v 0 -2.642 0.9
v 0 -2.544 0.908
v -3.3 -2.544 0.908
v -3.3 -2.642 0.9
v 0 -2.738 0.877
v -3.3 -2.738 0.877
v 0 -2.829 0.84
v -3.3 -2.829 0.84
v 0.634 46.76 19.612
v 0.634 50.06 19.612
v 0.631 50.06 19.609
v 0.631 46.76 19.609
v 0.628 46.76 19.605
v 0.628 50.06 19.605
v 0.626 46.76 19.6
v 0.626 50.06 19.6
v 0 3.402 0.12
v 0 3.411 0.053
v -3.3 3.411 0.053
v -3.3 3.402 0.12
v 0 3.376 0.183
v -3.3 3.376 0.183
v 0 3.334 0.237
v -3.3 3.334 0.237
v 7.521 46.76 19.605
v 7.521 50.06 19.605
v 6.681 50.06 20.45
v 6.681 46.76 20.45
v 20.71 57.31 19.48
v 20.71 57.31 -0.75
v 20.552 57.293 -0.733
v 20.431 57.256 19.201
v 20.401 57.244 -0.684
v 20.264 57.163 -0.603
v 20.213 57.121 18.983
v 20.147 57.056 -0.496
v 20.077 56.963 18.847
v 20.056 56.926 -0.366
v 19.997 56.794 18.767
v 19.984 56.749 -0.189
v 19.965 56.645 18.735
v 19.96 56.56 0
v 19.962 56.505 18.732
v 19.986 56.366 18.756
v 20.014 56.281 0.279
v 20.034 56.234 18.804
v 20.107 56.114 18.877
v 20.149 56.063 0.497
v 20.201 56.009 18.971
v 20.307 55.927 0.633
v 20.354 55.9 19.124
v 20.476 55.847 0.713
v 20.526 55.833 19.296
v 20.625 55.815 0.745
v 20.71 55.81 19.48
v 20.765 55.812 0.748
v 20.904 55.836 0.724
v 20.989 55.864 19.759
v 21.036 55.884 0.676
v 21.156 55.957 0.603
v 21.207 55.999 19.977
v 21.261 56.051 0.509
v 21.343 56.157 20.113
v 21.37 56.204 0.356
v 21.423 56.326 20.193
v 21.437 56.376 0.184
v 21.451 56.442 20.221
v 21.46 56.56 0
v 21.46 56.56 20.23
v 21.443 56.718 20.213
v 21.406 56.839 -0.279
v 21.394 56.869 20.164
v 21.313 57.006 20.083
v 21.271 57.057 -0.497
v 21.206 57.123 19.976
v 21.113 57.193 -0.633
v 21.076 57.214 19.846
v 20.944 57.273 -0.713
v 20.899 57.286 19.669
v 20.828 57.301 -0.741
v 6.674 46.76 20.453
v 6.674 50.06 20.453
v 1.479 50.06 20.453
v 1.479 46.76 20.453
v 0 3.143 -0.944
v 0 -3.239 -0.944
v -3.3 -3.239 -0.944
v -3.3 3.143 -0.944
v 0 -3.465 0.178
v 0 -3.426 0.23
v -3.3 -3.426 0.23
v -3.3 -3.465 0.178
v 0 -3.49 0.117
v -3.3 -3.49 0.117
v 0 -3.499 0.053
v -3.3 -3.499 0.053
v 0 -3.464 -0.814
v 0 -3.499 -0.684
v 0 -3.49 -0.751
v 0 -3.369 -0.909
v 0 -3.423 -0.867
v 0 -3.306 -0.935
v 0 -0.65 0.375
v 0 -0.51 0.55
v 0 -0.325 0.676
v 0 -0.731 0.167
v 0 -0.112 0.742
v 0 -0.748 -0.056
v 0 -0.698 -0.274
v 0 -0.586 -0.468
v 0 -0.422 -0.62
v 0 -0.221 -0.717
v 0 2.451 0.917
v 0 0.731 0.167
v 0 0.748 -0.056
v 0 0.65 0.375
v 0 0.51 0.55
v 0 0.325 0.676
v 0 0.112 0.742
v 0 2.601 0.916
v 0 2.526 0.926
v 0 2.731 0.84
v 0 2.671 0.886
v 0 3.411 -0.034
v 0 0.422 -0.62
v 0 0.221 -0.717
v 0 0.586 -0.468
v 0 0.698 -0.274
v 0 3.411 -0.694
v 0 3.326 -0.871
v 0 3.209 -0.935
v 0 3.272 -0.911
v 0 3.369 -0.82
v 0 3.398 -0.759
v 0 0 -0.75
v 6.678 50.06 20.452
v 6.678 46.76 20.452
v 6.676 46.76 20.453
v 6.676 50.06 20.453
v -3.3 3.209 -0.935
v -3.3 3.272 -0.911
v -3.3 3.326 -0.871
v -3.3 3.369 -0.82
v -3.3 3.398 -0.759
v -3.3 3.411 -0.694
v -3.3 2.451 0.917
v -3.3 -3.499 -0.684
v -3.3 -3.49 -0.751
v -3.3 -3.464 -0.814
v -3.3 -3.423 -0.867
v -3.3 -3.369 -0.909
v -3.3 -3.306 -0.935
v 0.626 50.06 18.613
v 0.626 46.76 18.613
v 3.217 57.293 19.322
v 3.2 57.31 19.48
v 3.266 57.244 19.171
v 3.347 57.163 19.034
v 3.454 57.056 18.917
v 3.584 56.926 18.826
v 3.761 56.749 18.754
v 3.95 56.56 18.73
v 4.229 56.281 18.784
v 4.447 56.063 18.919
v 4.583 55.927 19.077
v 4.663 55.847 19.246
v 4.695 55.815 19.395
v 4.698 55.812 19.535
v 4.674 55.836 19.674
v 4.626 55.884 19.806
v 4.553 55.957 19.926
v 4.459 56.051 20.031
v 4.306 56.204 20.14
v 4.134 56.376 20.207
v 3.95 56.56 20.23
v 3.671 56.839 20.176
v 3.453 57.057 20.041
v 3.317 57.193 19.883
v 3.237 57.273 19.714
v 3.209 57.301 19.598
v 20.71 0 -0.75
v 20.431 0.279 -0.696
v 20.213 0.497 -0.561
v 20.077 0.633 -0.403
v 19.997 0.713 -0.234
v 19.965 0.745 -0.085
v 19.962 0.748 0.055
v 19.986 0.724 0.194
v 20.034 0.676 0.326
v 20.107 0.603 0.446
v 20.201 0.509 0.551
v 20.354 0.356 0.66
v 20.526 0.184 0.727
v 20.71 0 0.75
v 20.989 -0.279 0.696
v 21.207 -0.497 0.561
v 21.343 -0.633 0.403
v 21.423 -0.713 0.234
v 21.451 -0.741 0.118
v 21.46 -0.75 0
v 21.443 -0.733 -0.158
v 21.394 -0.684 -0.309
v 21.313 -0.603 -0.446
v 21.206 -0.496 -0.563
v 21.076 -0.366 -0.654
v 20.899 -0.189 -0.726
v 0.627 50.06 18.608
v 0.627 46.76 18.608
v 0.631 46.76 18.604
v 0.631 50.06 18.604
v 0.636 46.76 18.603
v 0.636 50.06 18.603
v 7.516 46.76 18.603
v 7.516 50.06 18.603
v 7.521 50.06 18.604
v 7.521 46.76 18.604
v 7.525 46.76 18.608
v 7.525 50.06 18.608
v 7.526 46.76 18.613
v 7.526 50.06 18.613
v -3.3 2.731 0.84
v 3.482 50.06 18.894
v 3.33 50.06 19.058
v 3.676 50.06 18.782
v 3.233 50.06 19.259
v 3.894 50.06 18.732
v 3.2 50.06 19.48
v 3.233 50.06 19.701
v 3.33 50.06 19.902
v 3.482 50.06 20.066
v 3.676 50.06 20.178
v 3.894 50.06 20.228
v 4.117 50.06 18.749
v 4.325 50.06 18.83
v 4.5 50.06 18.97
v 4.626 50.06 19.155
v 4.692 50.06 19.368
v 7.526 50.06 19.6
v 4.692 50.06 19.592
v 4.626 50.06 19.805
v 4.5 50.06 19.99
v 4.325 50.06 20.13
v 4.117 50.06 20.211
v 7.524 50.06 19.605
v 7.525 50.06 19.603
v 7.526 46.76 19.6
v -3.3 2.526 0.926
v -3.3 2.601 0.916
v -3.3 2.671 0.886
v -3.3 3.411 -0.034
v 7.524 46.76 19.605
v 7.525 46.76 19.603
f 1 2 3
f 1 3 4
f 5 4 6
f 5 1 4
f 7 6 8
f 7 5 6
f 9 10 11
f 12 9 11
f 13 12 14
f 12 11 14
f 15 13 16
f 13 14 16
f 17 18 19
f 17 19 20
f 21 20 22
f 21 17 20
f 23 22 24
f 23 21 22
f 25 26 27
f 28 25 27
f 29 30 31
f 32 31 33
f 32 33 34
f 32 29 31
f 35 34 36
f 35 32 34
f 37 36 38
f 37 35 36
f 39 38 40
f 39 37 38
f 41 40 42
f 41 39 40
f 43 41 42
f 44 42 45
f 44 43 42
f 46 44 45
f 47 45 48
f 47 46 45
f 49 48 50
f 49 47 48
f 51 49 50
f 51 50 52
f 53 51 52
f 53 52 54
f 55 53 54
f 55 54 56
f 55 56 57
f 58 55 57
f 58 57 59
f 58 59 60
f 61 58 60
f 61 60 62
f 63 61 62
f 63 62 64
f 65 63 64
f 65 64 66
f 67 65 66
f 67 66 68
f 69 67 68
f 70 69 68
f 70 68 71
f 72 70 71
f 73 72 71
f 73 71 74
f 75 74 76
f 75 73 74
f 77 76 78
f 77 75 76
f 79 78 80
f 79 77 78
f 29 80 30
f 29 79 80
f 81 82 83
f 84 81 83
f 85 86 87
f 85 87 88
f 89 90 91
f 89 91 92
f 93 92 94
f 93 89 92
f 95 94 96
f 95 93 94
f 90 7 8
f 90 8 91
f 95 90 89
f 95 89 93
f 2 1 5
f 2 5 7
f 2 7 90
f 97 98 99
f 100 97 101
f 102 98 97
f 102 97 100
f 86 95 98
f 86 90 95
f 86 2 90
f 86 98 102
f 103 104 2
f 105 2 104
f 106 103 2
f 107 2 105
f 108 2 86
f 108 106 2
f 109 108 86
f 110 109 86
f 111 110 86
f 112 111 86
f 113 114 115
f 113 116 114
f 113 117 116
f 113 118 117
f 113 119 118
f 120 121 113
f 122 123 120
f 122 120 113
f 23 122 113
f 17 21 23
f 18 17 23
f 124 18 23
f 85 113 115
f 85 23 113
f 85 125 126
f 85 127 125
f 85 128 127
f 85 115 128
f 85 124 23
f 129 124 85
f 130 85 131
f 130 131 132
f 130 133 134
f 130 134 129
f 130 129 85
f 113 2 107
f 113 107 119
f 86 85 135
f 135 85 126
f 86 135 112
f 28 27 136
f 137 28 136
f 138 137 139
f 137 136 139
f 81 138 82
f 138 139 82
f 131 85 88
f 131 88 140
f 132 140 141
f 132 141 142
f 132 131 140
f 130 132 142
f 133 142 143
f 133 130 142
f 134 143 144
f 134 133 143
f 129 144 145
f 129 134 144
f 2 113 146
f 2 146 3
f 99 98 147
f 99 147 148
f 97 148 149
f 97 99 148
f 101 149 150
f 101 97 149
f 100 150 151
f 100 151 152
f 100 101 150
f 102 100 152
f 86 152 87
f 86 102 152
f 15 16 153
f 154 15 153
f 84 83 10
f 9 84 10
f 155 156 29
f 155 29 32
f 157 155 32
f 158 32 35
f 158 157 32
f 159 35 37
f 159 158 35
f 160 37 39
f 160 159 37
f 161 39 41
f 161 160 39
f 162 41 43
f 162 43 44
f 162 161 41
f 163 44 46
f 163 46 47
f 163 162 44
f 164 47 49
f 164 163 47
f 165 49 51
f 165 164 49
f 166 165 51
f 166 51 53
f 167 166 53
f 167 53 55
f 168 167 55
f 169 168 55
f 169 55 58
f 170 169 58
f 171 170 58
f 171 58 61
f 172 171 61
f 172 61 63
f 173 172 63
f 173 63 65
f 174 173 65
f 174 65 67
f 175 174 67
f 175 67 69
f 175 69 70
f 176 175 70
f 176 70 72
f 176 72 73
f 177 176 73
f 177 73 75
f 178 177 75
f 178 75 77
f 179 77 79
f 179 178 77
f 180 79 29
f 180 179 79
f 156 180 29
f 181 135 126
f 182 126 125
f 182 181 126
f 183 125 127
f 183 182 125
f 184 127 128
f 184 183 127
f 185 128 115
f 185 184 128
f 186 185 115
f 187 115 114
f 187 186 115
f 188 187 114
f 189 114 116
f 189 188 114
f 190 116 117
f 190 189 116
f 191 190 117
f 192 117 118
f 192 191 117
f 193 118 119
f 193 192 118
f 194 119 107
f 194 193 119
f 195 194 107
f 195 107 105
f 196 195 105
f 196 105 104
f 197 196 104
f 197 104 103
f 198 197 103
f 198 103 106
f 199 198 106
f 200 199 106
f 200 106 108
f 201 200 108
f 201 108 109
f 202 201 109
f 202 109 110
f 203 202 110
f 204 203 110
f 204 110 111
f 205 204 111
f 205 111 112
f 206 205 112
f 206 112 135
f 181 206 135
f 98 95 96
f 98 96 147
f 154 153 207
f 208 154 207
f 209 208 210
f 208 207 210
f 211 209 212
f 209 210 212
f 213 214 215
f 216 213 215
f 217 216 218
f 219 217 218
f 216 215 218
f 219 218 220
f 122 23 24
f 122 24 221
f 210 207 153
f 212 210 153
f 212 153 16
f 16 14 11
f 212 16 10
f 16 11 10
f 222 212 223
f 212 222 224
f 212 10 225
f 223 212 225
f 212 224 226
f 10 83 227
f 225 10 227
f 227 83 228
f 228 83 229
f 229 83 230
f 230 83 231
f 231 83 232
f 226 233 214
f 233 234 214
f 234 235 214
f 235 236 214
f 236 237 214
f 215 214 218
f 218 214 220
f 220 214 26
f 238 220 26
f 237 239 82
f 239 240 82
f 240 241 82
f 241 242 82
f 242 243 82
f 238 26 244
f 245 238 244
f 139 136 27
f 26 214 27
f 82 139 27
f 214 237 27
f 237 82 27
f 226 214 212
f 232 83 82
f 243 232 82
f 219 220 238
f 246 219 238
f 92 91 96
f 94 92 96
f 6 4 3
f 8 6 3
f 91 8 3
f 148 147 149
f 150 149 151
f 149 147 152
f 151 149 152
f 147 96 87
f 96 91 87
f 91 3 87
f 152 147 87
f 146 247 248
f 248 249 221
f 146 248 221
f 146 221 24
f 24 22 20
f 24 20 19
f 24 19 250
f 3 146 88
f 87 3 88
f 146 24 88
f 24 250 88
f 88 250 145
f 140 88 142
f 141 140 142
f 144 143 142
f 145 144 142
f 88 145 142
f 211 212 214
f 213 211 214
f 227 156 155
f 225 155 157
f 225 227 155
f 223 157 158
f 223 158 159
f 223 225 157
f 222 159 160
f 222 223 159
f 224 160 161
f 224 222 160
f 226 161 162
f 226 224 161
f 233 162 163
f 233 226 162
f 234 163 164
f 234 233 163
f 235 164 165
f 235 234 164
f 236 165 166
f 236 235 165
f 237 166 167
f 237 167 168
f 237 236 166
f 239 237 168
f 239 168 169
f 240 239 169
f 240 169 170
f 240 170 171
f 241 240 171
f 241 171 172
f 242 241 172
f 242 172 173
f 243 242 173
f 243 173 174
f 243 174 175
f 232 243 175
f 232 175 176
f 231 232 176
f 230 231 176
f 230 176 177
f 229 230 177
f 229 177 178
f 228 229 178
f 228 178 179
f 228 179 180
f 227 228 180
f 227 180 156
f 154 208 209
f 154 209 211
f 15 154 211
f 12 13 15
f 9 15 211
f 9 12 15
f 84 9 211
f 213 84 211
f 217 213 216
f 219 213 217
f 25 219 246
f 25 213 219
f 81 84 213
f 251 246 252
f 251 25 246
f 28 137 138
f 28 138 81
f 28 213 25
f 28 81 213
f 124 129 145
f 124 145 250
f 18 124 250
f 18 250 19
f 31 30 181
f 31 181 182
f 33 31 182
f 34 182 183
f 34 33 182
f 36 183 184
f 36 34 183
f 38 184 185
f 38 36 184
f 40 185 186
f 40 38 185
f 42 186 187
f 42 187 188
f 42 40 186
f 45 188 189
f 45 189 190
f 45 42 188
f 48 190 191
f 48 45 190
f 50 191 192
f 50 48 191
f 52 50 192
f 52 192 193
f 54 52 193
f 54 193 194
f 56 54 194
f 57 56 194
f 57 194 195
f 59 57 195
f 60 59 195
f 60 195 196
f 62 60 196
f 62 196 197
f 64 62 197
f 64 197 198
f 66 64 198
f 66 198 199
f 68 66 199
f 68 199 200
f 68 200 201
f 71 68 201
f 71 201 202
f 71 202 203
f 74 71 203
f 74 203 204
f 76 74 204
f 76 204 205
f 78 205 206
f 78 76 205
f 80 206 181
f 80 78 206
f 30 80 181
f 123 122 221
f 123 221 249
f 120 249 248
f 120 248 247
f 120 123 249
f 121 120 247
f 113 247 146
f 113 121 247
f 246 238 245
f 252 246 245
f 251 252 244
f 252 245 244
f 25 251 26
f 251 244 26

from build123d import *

# Parameters (mm, degrees)
ESQUISSE1_R        = 0.75
BOSS_EXTRU_1_DEPTH = 3.3
BOSS_EXTRU_2_DEPTH = 3.3


with BuildPart() as part:
    # Balayage1: sweep along a curve in space
    with BuildLine() as balayage1_path:
        Line((0, 0, 0), (20.71, 0, 0))
        Line((20.71, 0, 0), (20.71, 56.56, 0))
        Line((20.71, 56.56, 0), (20.71, 56.56, 19.48))
        Line((20.71, 56.56, 19.48), (3.95, 56.56, 19.48))
        Line((3.95, 56.56, 19.48), (3.95, 50.06, 19.48))
    # Esquisse1 → Balayage1 (sweep)
    with BuildSketch(Plane(origin=(0, 0, 0), x_dir=(0, 0, -1), z_dir=(1, 0, 0))):
        Circle(ESQUISSE1_R)
    sweep(path=balayage1_path.line, transition=Transition.RIGHT)

    # Esquisse2 → Boss.-Extru.1 (add)
    with BuildSketch(Plane.ZY):
        with BuildLine():
            Line((-0.693559654, 3.410973121), (-0.033559654, 3.410973121))
            Line((-0.033559654, 3.410973121), (0.052886955, 3.410800656))
            ThreePointArc((0.052886955, 3.410800656), (0.152585895, 3.390814178), (0.237103646, 3.334280227))
            Line((0.237103646, 3.334280227), (0.840288261, 2.731095613))
            ThreePointArc((0.840288261, 2.731095613), (0.915698502, 2.601090787), (0.916612811, 2.450800656))
            Line((0.916612811, 2.450800656), (0.907780092, -2.544199344))
            ThreePointArc((0.907780092, -2.544199344), (0.890549579, -2.690753591), (0.840288109, -2.829493716))
            Line((0.840288109, -2.829493716), (0.229663651, -3.425976039))
            ThreePointArc((0.229663651, -3.425976039), (0.148335129, -3.479631619), (0.052886955, -3.499199344))
            Line((0.052886955, -3.499199344), (-0.683559654, -3.499199344))
            ThreePointArc((-0.683559654, -3.499199344), (-0.867407417, -3.423047107), (-0.943559654, -3.239199344))
            Line((-0.943559654, -3.239199344), (-0.943559654, 3.142794831))
            ThreePointArc((-0.943559654, 3.142794831), (-0.871366367, 3.326111221), (-0.693559654, 3.410973121))
        make_face()
    extrude(amount=BOSS_EXTRU_1_DEPTH)

    # Esquisse8 → Boss.-Extru.2 (add)
    with BuildSketch(Plane.XZ.offset(-50.06)):
        with BuildLine():
            Line((0.626082703, 19.600404574), (0.626082703, 18.6131001))
            ThreePointArc((0.626082703, 18.6131001), (0.629011635, 18.606029032), (0.636082703, 18.6031001))
            Line((0.636082703, 18.6031001), (7.516082703, 18.6031001))
            ThreePointArc((7.516082703, 18.6031001), (7.523153771, 18.606029032), (7.526082703, 18.6131001))
            Line((7.526082703, 18.6131001), (7.526082703, 19.600404544))
            ThreePointArc((7.526082703, 19.600404544), (7.524677417, 19.603797205), (7.521284755, 19.605202492))
            Line((7.521284755, 19.605202492), (6.680559004, 20.450070379))
            ThreePointArc((6.680559004, 20.450070379), (6.677327923, 20.452237942), (6.673512365, 20.452999341))
            Line((6.673512365, 20.452999341), (1.47867747, 20.452999341))
            Line((1.47867747, 20.452999341), (0.633809583, 19.612273589))
            ThreePointArc((0.633809583, 19.612273589), (0.629318413, 19.606747742), (0.626082703, 19.600404574))
        make_face()
    extrude(amount=BOSS_EXTRU_2_DEPTH)


solid = part.part
